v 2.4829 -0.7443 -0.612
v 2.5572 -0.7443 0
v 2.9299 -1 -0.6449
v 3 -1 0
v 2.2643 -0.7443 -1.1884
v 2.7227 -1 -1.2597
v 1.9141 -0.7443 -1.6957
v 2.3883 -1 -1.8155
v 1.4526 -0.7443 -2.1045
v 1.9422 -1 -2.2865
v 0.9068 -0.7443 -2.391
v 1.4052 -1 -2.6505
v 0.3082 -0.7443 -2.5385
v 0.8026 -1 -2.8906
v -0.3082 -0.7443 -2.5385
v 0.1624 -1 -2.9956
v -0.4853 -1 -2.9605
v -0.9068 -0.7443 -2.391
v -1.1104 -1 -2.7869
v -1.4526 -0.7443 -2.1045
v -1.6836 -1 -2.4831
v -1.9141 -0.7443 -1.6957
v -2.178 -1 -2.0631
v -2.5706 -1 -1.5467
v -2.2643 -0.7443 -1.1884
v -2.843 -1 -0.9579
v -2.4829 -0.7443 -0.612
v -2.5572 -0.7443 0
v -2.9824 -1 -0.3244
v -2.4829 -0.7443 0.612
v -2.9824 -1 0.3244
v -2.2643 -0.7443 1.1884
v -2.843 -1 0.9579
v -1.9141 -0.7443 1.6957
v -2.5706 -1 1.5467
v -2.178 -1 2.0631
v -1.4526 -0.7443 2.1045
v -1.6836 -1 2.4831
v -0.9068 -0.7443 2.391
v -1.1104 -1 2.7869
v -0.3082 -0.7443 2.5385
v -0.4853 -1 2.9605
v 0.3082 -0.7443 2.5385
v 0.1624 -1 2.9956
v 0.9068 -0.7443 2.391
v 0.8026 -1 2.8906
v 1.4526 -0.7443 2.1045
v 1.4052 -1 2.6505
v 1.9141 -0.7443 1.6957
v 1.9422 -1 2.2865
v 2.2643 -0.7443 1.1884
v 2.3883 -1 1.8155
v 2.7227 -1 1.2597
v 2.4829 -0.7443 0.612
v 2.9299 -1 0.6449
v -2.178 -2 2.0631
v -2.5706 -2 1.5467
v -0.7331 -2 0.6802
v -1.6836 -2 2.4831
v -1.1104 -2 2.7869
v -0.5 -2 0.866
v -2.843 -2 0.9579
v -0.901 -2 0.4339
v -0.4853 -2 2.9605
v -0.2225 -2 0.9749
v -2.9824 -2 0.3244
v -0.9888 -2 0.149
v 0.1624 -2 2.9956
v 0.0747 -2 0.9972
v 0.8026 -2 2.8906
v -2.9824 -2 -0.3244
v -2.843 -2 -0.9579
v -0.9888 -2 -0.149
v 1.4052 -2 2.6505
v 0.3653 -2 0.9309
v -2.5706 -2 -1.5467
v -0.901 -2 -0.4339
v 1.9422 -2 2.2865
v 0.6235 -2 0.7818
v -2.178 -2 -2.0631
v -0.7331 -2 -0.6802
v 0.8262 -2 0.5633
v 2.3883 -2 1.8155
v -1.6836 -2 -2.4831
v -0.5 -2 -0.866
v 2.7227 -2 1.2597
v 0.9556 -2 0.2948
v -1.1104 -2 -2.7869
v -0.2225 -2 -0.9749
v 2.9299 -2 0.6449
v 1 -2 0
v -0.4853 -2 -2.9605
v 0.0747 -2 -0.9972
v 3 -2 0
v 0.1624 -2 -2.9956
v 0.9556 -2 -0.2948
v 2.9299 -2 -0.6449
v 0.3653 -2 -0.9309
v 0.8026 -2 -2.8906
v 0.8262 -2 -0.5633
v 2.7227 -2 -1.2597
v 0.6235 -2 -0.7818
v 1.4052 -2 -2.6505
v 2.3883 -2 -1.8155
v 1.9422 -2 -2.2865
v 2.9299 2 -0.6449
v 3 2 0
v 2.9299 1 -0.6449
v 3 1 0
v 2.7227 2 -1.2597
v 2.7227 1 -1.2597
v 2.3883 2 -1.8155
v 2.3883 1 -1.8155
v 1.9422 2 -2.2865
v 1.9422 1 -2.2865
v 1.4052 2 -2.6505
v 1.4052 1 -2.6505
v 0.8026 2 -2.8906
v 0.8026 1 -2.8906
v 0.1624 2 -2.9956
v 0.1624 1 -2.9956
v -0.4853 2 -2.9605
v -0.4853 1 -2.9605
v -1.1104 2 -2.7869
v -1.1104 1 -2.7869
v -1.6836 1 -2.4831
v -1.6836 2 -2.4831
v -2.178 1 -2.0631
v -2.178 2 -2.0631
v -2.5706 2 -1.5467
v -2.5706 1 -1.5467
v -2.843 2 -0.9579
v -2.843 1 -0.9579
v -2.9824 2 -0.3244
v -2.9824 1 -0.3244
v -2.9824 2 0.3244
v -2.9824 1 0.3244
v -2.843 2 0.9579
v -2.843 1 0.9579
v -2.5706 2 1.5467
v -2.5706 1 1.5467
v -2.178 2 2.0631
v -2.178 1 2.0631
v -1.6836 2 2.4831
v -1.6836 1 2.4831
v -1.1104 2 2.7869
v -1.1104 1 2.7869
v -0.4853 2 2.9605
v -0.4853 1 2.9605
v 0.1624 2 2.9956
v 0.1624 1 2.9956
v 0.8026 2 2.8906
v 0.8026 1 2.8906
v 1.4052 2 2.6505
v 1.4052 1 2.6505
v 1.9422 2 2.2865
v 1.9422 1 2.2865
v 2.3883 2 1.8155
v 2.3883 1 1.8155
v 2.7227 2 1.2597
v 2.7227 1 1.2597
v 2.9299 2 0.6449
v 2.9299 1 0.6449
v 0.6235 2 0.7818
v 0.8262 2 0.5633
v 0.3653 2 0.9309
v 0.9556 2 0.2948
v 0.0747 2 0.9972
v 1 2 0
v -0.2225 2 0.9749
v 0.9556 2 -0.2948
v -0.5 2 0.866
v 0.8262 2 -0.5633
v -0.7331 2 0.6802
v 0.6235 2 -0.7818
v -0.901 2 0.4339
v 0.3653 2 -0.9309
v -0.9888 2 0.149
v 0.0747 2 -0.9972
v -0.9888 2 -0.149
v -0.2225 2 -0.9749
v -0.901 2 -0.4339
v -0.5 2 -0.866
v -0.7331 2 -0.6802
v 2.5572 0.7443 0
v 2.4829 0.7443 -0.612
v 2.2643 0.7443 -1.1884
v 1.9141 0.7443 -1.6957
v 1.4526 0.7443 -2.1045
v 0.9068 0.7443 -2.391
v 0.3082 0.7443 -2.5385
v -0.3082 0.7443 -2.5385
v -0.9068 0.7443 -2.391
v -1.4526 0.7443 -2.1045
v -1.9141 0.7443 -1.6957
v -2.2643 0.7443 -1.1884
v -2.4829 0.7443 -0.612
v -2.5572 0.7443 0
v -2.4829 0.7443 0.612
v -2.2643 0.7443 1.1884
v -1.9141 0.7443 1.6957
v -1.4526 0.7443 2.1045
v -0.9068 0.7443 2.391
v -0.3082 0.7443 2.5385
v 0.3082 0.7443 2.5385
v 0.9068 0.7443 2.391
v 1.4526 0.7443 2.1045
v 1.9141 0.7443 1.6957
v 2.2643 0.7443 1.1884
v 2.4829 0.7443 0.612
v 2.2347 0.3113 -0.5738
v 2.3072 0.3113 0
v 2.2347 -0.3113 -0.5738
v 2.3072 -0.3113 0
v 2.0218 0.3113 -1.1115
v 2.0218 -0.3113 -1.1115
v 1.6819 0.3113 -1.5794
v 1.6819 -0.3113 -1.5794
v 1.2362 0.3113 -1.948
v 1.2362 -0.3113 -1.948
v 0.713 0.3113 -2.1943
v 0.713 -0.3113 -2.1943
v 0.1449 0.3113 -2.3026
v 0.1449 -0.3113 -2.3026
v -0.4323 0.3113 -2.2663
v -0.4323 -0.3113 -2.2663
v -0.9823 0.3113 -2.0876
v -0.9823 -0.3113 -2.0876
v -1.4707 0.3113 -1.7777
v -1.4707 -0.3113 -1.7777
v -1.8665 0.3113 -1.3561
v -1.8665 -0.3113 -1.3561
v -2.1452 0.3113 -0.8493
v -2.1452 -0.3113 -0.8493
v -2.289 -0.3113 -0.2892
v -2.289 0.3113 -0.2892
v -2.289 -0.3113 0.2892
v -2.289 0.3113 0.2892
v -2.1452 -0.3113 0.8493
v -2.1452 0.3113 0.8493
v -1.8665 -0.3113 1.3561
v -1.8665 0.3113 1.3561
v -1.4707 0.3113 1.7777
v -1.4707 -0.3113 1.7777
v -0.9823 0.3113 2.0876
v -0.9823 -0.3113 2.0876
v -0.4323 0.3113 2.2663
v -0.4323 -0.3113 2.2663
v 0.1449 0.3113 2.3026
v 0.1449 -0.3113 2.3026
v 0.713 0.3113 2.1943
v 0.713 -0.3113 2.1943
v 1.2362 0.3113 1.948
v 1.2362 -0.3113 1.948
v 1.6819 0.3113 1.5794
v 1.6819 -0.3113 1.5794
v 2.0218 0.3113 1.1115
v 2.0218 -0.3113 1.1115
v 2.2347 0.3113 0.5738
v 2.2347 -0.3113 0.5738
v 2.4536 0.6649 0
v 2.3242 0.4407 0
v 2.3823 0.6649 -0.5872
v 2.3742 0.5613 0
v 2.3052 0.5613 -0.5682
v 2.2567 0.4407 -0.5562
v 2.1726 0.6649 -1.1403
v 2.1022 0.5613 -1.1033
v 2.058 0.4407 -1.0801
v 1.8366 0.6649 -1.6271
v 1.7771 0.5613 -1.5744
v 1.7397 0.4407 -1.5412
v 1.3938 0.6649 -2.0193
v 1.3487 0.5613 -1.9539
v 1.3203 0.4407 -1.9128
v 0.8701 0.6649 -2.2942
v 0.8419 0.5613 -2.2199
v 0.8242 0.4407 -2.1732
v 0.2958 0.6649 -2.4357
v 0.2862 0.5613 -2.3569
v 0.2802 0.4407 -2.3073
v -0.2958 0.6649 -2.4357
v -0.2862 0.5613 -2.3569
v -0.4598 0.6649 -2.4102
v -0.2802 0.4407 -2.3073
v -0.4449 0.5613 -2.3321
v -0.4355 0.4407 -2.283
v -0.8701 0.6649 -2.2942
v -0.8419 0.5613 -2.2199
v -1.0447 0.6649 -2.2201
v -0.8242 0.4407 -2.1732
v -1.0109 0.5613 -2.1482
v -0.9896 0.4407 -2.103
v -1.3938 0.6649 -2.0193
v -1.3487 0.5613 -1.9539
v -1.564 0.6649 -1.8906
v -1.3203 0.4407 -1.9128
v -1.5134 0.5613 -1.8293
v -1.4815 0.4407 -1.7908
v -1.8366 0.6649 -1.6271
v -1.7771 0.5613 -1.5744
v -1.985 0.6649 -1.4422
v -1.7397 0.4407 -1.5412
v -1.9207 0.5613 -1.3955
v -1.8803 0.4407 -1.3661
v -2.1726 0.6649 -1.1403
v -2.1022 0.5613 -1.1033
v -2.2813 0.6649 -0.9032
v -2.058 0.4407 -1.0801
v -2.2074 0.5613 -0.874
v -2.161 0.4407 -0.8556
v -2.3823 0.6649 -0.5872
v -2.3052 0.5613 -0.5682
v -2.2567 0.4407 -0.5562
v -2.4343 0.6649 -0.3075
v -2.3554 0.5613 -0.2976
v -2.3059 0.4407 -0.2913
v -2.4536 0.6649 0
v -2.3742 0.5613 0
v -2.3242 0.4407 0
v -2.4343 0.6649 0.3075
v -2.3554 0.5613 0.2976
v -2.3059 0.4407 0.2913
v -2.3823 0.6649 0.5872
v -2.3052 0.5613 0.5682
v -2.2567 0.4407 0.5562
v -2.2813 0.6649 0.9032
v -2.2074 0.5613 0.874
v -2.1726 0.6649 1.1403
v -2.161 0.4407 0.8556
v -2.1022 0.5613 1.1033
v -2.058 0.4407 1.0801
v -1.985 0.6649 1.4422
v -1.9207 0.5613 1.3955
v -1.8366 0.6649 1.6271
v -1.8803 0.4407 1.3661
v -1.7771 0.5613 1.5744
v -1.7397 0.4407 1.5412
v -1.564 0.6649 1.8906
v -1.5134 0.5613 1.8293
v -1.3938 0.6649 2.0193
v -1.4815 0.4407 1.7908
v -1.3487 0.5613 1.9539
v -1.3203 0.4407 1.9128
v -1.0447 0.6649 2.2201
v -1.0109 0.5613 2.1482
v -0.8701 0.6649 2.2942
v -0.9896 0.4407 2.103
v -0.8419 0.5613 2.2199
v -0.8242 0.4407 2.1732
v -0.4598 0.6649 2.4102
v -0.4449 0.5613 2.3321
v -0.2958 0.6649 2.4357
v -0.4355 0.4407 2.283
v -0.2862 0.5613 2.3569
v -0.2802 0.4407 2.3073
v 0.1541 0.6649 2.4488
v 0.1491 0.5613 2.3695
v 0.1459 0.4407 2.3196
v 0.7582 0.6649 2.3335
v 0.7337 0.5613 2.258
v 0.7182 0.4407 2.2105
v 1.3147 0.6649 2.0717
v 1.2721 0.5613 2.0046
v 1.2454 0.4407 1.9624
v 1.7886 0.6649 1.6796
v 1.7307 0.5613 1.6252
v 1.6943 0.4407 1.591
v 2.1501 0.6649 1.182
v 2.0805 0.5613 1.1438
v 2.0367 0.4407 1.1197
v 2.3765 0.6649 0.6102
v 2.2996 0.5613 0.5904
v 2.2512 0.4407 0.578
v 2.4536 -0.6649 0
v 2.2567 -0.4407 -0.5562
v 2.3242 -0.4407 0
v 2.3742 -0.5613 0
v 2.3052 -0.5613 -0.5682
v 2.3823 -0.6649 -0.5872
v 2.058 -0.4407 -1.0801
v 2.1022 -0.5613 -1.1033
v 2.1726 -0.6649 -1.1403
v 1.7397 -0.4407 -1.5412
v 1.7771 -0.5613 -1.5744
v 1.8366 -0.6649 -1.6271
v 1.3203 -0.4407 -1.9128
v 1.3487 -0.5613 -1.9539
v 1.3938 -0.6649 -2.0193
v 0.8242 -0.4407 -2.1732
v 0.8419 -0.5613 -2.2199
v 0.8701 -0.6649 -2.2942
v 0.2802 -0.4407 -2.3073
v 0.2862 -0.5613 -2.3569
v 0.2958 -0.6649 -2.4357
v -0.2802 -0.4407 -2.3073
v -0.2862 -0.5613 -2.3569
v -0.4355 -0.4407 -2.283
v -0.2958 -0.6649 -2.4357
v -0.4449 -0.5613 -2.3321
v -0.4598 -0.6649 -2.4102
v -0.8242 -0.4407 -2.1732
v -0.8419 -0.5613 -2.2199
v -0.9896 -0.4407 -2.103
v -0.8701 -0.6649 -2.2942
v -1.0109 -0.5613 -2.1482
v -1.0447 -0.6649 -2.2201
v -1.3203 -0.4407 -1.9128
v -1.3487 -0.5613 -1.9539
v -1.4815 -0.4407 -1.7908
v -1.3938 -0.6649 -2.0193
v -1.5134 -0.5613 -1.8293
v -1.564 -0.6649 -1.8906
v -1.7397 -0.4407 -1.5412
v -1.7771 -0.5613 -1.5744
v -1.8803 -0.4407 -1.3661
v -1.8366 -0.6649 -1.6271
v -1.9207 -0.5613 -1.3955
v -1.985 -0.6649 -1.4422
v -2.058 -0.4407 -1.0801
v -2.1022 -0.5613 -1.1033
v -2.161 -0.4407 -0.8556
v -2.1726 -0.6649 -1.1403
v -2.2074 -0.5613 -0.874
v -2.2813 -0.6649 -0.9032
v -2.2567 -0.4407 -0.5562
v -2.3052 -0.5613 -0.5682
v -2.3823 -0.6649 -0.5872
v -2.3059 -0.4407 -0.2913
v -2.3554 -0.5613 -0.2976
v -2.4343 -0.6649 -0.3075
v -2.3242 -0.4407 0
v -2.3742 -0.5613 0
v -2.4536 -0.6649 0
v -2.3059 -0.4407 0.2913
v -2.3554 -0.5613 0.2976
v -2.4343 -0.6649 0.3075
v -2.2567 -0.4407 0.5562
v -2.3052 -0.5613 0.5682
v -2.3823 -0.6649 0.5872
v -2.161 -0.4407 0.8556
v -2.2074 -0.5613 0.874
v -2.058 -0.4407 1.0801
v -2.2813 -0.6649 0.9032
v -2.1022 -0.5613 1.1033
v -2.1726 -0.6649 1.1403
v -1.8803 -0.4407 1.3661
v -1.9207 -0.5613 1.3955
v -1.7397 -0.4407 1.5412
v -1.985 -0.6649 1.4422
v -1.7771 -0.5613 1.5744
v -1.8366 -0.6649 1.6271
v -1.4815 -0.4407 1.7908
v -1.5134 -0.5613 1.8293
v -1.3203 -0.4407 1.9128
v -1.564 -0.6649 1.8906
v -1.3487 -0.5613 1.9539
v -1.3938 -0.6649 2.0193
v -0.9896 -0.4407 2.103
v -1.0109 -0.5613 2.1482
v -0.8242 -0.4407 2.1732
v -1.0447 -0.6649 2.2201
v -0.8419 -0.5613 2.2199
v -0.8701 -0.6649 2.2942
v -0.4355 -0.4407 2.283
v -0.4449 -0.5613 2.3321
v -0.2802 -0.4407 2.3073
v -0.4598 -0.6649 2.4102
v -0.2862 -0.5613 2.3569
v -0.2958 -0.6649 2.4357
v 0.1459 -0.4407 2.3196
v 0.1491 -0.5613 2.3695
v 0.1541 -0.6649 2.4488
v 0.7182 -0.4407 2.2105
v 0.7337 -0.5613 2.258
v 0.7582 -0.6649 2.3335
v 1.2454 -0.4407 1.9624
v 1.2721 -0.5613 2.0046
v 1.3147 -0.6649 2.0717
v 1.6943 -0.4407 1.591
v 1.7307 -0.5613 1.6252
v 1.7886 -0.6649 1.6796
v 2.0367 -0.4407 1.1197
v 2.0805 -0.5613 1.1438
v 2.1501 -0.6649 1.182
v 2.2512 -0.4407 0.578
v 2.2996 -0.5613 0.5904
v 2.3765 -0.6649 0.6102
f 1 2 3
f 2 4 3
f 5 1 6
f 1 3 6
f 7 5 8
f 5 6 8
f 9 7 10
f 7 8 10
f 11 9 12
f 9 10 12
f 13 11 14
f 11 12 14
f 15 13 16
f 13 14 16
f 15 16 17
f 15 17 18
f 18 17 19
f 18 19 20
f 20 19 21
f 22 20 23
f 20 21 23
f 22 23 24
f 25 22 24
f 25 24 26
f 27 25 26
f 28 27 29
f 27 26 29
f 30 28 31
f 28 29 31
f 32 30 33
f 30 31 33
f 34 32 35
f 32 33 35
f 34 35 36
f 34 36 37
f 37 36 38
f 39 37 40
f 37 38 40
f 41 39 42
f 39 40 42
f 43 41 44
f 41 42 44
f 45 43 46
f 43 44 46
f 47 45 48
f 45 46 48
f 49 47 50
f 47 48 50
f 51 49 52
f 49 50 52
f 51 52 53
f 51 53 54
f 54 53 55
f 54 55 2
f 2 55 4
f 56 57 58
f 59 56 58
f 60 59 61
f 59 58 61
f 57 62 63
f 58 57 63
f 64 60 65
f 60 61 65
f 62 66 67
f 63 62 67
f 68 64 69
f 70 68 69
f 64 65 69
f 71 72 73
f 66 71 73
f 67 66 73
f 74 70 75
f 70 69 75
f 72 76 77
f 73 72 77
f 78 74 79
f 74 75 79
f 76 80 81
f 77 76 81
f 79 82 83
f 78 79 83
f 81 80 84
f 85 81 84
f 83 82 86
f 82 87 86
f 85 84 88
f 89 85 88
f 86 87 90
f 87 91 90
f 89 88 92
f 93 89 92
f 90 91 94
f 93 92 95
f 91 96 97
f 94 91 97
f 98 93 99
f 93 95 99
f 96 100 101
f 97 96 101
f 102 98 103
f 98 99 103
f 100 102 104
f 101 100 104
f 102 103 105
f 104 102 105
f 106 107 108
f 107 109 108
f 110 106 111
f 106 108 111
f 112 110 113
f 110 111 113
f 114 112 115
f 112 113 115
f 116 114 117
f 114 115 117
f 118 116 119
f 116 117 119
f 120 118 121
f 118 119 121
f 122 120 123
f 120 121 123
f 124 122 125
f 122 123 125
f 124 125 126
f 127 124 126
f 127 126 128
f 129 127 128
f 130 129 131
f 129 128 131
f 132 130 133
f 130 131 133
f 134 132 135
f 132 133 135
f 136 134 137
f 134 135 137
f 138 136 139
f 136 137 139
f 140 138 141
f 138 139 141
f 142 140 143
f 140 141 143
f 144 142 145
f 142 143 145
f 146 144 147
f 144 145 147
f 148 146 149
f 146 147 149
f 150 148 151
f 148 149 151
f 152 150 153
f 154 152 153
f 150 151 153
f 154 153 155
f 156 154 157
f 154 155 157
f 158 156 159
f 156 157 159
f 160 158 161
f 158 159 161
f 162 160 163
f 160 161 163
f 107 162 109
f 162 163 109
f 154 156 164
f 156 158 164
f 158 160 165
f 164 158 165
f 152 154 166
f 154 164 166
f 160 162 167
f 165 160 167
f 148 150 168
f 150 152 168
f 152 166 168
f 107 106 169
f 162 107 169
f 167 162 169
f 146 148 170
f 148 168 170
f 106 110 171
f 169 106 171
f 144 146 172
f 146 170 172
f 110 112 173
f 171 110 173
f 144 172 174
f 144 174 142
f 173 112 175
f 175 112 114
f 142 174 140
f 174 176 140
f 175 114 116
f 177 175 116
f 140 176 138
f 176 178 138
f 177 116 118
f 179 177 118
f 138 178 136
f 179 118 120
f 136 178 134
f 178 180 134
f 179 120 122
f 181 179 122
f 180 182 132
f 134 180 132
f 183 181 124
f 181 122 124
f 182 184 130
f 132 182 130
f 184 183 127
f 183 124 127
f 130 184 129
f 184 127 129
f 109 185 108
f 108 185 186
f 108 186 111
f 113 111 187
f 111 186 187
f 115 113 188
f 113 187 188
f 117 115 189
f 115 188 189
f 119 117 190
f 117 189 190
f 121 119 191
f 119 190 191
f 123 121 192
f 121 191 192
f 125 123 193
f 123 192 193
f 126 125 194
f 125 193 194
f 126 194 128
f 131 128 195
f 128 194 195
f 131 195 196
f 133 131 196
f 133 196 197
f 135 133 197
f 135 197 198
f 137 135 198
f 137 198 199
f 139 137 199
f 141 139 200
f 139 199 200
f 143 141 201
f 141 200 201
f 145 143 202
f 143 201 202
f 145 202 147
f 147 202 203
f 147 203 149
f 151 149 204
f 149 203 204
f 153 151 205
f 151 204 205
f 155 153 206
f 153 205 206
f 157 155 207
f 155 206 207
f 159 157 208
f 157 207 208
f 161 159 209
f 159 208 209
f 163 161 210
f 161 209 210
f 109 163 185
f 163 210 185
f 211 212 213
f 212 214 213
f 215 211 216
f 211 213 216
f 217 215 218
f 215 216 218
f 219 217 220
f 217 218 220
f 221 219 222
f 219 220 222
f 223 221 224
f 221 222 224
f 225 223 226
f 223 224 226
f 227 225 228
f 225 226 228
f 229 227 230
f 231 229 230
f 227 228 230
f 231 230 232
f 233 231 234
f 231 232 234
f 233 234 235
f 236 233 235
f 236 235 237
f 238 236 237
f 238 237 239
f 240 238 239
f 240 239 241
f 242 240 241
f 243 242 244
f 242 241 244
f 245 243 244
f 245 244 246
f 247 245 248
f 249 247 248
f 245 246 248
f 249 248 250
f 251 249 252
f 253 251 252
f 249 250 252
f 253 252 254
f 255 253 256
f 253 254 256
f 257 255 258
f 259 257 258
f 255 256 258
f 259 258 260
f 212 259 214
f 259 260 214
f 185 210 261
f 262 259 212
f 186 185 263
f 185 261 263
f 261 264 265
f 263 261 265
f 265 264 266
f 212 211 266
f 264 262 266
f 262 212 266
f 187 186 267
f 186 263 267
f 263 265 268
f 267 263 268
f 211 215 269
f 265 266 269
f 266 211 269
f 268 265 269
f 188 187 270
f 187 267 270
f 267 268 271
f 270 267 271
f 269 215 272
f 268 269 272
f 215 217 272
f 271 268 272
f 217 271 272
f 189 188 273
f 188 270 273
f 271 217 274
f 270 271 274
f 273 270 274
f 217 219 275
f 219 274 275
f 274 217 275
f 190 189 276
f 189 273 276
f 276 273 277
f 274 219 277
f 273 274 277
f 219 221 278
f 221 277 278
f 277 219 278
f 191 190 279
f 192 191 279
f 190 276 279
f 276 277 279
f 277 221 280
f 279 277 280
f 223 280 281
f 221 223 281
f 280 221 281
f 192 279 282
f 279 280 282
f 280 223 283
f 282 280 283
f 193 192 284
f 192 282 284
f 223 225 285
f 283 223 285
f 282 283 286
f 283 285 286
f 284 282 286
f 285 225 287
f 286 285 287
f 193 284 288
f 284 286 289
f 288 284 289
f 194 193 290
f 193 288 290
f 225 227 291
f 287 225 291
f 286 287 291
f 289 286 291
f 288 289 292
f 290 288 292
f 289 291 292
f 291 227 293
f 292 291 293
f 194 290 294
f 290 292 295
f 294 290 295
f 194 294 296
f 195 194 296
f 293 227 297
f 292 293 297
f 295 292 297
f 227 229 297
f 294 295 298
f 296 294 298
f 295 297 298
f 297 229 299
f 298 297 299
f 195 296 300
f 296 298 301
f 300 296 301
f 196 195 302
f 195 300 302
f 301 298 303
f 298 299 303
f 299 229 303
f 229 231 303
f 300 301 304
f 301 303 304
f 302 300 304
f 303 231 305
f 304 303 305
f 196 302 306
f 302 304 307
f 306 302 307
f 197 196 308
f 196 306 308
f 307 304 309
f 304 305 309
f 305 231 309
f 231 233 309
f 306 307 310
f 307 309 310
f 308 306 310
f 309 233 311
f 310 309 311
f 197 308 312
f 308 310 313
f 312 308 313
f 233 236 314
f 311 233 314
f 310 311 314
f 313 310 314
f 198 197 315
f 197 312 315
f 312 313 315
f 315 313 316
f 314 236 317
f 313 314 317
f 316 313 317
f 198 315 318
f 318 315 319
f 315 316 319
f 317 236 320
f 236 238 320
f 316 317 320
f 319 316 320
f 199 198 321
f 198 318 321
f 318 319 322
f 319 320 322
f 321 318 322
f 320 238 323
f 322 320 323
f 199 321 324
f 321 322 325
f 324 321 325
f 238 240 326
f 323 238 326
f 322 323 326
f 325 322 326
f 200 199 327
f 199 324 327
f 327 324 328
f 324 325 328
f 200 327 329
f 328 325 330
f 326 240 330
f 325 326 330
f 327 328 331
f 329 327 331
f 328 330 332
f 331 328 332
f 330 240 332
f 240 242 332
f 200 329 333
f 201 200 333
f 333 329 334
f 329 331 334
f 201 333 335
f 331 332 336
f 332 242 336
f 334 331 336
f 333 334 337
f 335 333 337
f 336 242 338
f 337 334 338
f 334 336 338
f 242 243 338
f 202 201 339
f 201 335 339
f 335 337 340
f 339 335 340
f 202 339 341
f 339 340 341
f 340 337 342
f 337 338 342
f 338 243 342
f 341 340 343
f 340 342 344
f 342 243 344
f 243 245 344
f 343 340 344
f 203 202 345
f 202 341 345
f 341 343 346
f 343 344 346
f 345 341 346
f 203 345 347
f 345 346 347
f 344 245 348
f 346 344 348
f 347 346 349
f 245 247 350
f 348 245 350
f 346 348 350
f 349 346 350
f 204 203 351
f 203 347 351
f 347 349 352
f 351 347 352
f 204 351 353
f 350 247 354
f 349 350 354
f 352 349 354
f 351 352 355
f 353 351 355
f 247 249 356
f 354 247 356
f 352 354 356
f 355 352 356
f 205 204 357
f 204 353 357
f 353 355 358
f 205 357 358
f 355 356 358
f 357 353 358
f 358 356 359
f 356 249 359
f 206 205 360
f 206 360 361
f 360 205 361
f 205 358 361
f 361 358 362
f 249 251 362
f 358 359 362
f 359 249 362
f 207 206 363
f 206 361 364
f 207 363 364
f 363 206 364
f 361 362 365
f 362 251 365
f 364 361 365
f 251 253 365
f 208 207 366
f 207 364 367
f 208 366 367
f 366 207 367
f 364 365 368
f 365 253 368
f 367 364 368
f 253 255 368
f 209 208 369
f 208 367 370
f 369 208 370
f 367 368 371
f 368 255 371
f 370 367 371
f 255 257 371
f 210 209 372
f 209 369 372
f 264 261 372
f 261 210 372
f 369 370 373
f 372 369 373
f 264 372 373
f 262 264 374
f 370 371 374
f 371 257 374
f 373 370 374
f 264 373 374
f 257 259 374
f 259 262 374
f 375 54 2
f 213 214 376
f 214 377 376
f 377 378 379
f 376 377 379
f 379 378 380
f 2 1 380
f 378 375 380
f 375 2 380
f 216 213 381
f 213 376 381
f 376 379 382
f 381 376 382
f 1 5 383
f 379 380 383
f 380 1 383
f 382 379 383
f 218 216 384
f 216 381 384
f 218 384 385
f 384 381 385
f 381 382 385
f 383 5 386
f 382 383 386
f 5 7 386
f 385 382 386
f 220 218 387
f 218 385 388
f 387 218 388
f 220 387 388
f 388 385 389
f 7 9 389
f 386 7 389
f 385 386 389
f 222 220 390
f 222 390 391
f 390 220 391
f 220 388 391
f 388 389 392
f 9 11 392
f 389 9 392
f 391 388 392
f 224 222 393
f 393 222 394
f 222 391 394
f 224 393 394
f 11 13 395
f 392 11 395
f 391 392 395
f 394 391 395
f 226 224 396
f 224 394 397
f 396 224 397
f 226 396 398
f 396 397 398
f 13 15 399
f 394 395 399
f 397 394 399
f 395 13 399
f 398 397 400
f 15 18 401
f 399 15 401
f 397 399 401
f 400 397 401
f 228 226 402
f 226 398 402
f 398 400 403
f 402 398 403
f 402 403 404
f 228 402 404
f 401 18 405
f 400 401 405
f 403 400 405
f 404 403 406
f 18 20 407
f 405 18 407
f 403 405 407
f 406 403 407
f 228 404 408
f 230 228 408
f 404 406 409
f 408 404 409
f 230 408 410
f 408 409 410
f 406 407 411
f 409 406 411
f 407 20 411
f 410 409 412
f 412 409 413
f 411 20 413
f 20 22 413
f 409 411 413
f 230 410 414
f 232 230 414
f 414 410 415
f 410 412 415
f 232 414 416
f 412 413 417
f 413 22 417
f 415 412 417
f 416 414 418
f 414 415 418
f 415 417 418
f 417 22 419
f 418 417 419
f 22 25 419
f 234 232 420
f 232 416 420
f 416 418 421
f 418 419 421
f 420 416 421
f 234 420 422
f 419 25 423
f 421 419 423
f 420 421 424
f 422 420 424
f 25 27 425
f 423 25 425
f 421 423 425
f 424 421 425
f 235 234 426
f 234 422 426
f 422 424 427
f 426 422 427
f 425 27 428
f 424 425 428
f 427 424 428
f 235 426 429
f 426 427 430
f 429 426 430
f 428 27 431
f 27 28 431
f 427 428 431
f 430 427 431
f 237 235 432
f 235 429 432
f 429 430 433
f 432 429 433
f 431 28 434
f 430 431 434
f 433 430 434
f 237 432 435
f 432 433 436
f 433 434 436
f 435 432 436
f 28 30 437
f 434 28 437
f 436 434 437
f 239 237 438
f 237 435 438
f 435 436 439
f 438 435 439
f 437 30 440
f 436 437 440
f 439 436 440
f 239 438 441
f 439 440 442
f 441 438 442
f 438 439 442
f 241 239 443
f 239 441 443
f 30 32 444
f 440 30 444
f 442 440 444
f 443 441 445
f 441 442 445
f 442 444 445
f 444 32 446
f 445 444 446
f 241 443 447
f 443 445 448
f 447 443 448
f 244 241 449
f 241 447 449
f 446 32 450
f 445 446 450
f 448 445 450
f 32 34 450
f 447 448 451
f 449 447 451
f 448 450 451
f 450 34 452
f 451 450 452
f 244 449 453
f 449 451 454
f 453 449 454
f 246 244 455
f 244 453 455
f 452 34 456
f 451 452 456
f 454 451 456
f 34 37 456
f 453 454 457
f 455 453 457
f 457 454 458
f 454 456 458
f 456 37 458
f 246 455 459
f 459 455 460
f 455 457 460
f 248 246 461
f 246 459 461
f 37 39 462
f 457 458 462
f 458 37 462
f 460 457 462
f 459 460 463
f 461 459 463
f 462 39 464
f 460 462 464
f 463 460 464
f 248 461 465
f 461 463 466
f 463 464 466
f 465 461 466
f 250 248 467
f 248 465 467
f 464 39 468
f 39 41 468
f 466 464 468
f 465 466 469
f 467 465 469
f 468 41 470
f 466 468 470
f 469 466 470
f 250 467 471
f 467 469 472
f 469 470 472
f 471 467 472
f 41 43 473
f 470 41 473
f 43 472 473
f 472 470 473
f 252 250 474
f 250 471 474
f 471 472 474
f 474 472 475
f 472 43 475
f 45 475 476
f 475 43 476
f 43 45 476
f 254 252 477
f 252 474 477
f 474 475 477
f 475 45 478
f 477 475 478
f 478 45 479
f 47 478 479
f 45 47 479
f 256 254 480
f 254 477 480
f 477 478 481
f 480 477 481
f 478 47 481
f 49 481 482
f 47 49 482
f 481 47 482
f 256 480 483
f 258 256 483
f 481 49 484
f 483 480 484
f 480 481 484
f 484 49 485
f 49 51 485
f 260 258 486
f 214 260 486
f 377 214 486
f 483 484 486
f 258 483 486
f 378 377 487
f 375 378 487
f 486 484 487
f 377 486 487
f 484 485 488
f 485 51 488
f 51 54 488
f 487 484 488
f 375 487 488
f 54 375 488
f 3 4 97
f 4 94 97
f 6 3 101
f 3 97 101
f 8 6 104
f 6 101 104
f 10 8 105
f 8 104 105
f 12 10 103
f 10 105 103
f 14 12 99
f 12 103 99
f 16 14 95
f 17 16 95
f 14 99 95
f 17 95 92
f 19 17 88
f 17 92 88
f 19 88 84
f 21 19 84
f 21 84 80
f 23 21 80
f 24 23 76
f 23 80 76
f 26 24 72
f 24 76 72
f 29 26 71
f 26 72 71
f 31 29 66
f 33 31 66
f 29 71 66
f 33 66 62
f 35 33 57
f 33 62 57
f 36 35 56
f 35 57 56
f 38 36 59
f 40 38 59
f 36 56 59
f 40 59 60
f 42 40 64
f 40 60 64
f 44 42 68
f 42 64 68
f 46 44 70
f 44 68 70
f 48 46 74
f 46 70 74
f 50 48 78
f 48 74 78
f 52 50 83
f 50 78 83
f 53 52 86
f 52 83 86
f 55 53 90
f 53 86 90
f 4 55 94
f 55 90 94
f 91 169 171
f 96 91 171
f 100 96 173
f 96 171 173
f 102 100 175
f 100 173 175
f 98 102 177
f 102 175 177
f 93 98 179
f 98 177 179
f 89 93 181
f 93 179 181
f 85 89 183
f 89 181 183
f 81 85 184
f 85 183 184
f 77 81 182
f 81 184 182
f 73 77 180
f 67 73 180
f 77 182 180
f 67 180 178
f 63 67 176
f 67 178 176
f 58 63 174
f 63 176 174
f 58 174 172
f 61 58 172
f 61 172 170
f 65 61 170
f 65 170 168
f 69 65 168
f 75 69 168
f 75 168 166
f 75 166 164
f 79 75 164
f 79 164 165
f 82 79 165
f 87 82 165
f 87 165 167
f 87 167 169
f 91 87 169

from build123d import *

# Parameters (mm, degrees)
SKETCH2_R          = 1
CUT_EXTRUDE1_DEPTH = 5


with BuildPart() as part:
    # Sketch1 → Revolve2 (revolve)
    with BuildSketch(Plane.XY):
        with BuildLine():
            Line((0, 2), (3, 2))
            Line((3, 2), (3, 1))
            Line((3, 1), (2.557179677, 0.744337567))
            ThreePointArc((2.557179677, 0.744337567), (2.374166975, 0.561324865), (2.307179677, 0.311324865))
            Line((2.307179677, 0.311324865), (2.307179677, -0.311324865))
            ThreePointArc((2.307179677, -0.311324865), (2.374166975, -0.561324865), (2.557179677, -0.744337567))
            Line((2.557179677, -0.744337567), (3, -1))
            Line((3, -1), (3, -2))
            Line((3, -2), (0, -2))
            Line((0, -2), (0, 2))
        make_face()
    revolve(axis=Axis((0, -2, 0), (0, 1, 0)))

    # Sketch2 → Cut-Extrude1 (cut, through all)
    with BuildSketch(Plane(origin=(0, 2, 0), x_dir=(1, 0, 0), z_dir=(0, 1, 0))):
        Circle(SKETCH2_R)
    extrude(amount=-CUT_EXTRUDE1_DEPTH, mode=Mode.SUBTRACT)


solid = part.part
